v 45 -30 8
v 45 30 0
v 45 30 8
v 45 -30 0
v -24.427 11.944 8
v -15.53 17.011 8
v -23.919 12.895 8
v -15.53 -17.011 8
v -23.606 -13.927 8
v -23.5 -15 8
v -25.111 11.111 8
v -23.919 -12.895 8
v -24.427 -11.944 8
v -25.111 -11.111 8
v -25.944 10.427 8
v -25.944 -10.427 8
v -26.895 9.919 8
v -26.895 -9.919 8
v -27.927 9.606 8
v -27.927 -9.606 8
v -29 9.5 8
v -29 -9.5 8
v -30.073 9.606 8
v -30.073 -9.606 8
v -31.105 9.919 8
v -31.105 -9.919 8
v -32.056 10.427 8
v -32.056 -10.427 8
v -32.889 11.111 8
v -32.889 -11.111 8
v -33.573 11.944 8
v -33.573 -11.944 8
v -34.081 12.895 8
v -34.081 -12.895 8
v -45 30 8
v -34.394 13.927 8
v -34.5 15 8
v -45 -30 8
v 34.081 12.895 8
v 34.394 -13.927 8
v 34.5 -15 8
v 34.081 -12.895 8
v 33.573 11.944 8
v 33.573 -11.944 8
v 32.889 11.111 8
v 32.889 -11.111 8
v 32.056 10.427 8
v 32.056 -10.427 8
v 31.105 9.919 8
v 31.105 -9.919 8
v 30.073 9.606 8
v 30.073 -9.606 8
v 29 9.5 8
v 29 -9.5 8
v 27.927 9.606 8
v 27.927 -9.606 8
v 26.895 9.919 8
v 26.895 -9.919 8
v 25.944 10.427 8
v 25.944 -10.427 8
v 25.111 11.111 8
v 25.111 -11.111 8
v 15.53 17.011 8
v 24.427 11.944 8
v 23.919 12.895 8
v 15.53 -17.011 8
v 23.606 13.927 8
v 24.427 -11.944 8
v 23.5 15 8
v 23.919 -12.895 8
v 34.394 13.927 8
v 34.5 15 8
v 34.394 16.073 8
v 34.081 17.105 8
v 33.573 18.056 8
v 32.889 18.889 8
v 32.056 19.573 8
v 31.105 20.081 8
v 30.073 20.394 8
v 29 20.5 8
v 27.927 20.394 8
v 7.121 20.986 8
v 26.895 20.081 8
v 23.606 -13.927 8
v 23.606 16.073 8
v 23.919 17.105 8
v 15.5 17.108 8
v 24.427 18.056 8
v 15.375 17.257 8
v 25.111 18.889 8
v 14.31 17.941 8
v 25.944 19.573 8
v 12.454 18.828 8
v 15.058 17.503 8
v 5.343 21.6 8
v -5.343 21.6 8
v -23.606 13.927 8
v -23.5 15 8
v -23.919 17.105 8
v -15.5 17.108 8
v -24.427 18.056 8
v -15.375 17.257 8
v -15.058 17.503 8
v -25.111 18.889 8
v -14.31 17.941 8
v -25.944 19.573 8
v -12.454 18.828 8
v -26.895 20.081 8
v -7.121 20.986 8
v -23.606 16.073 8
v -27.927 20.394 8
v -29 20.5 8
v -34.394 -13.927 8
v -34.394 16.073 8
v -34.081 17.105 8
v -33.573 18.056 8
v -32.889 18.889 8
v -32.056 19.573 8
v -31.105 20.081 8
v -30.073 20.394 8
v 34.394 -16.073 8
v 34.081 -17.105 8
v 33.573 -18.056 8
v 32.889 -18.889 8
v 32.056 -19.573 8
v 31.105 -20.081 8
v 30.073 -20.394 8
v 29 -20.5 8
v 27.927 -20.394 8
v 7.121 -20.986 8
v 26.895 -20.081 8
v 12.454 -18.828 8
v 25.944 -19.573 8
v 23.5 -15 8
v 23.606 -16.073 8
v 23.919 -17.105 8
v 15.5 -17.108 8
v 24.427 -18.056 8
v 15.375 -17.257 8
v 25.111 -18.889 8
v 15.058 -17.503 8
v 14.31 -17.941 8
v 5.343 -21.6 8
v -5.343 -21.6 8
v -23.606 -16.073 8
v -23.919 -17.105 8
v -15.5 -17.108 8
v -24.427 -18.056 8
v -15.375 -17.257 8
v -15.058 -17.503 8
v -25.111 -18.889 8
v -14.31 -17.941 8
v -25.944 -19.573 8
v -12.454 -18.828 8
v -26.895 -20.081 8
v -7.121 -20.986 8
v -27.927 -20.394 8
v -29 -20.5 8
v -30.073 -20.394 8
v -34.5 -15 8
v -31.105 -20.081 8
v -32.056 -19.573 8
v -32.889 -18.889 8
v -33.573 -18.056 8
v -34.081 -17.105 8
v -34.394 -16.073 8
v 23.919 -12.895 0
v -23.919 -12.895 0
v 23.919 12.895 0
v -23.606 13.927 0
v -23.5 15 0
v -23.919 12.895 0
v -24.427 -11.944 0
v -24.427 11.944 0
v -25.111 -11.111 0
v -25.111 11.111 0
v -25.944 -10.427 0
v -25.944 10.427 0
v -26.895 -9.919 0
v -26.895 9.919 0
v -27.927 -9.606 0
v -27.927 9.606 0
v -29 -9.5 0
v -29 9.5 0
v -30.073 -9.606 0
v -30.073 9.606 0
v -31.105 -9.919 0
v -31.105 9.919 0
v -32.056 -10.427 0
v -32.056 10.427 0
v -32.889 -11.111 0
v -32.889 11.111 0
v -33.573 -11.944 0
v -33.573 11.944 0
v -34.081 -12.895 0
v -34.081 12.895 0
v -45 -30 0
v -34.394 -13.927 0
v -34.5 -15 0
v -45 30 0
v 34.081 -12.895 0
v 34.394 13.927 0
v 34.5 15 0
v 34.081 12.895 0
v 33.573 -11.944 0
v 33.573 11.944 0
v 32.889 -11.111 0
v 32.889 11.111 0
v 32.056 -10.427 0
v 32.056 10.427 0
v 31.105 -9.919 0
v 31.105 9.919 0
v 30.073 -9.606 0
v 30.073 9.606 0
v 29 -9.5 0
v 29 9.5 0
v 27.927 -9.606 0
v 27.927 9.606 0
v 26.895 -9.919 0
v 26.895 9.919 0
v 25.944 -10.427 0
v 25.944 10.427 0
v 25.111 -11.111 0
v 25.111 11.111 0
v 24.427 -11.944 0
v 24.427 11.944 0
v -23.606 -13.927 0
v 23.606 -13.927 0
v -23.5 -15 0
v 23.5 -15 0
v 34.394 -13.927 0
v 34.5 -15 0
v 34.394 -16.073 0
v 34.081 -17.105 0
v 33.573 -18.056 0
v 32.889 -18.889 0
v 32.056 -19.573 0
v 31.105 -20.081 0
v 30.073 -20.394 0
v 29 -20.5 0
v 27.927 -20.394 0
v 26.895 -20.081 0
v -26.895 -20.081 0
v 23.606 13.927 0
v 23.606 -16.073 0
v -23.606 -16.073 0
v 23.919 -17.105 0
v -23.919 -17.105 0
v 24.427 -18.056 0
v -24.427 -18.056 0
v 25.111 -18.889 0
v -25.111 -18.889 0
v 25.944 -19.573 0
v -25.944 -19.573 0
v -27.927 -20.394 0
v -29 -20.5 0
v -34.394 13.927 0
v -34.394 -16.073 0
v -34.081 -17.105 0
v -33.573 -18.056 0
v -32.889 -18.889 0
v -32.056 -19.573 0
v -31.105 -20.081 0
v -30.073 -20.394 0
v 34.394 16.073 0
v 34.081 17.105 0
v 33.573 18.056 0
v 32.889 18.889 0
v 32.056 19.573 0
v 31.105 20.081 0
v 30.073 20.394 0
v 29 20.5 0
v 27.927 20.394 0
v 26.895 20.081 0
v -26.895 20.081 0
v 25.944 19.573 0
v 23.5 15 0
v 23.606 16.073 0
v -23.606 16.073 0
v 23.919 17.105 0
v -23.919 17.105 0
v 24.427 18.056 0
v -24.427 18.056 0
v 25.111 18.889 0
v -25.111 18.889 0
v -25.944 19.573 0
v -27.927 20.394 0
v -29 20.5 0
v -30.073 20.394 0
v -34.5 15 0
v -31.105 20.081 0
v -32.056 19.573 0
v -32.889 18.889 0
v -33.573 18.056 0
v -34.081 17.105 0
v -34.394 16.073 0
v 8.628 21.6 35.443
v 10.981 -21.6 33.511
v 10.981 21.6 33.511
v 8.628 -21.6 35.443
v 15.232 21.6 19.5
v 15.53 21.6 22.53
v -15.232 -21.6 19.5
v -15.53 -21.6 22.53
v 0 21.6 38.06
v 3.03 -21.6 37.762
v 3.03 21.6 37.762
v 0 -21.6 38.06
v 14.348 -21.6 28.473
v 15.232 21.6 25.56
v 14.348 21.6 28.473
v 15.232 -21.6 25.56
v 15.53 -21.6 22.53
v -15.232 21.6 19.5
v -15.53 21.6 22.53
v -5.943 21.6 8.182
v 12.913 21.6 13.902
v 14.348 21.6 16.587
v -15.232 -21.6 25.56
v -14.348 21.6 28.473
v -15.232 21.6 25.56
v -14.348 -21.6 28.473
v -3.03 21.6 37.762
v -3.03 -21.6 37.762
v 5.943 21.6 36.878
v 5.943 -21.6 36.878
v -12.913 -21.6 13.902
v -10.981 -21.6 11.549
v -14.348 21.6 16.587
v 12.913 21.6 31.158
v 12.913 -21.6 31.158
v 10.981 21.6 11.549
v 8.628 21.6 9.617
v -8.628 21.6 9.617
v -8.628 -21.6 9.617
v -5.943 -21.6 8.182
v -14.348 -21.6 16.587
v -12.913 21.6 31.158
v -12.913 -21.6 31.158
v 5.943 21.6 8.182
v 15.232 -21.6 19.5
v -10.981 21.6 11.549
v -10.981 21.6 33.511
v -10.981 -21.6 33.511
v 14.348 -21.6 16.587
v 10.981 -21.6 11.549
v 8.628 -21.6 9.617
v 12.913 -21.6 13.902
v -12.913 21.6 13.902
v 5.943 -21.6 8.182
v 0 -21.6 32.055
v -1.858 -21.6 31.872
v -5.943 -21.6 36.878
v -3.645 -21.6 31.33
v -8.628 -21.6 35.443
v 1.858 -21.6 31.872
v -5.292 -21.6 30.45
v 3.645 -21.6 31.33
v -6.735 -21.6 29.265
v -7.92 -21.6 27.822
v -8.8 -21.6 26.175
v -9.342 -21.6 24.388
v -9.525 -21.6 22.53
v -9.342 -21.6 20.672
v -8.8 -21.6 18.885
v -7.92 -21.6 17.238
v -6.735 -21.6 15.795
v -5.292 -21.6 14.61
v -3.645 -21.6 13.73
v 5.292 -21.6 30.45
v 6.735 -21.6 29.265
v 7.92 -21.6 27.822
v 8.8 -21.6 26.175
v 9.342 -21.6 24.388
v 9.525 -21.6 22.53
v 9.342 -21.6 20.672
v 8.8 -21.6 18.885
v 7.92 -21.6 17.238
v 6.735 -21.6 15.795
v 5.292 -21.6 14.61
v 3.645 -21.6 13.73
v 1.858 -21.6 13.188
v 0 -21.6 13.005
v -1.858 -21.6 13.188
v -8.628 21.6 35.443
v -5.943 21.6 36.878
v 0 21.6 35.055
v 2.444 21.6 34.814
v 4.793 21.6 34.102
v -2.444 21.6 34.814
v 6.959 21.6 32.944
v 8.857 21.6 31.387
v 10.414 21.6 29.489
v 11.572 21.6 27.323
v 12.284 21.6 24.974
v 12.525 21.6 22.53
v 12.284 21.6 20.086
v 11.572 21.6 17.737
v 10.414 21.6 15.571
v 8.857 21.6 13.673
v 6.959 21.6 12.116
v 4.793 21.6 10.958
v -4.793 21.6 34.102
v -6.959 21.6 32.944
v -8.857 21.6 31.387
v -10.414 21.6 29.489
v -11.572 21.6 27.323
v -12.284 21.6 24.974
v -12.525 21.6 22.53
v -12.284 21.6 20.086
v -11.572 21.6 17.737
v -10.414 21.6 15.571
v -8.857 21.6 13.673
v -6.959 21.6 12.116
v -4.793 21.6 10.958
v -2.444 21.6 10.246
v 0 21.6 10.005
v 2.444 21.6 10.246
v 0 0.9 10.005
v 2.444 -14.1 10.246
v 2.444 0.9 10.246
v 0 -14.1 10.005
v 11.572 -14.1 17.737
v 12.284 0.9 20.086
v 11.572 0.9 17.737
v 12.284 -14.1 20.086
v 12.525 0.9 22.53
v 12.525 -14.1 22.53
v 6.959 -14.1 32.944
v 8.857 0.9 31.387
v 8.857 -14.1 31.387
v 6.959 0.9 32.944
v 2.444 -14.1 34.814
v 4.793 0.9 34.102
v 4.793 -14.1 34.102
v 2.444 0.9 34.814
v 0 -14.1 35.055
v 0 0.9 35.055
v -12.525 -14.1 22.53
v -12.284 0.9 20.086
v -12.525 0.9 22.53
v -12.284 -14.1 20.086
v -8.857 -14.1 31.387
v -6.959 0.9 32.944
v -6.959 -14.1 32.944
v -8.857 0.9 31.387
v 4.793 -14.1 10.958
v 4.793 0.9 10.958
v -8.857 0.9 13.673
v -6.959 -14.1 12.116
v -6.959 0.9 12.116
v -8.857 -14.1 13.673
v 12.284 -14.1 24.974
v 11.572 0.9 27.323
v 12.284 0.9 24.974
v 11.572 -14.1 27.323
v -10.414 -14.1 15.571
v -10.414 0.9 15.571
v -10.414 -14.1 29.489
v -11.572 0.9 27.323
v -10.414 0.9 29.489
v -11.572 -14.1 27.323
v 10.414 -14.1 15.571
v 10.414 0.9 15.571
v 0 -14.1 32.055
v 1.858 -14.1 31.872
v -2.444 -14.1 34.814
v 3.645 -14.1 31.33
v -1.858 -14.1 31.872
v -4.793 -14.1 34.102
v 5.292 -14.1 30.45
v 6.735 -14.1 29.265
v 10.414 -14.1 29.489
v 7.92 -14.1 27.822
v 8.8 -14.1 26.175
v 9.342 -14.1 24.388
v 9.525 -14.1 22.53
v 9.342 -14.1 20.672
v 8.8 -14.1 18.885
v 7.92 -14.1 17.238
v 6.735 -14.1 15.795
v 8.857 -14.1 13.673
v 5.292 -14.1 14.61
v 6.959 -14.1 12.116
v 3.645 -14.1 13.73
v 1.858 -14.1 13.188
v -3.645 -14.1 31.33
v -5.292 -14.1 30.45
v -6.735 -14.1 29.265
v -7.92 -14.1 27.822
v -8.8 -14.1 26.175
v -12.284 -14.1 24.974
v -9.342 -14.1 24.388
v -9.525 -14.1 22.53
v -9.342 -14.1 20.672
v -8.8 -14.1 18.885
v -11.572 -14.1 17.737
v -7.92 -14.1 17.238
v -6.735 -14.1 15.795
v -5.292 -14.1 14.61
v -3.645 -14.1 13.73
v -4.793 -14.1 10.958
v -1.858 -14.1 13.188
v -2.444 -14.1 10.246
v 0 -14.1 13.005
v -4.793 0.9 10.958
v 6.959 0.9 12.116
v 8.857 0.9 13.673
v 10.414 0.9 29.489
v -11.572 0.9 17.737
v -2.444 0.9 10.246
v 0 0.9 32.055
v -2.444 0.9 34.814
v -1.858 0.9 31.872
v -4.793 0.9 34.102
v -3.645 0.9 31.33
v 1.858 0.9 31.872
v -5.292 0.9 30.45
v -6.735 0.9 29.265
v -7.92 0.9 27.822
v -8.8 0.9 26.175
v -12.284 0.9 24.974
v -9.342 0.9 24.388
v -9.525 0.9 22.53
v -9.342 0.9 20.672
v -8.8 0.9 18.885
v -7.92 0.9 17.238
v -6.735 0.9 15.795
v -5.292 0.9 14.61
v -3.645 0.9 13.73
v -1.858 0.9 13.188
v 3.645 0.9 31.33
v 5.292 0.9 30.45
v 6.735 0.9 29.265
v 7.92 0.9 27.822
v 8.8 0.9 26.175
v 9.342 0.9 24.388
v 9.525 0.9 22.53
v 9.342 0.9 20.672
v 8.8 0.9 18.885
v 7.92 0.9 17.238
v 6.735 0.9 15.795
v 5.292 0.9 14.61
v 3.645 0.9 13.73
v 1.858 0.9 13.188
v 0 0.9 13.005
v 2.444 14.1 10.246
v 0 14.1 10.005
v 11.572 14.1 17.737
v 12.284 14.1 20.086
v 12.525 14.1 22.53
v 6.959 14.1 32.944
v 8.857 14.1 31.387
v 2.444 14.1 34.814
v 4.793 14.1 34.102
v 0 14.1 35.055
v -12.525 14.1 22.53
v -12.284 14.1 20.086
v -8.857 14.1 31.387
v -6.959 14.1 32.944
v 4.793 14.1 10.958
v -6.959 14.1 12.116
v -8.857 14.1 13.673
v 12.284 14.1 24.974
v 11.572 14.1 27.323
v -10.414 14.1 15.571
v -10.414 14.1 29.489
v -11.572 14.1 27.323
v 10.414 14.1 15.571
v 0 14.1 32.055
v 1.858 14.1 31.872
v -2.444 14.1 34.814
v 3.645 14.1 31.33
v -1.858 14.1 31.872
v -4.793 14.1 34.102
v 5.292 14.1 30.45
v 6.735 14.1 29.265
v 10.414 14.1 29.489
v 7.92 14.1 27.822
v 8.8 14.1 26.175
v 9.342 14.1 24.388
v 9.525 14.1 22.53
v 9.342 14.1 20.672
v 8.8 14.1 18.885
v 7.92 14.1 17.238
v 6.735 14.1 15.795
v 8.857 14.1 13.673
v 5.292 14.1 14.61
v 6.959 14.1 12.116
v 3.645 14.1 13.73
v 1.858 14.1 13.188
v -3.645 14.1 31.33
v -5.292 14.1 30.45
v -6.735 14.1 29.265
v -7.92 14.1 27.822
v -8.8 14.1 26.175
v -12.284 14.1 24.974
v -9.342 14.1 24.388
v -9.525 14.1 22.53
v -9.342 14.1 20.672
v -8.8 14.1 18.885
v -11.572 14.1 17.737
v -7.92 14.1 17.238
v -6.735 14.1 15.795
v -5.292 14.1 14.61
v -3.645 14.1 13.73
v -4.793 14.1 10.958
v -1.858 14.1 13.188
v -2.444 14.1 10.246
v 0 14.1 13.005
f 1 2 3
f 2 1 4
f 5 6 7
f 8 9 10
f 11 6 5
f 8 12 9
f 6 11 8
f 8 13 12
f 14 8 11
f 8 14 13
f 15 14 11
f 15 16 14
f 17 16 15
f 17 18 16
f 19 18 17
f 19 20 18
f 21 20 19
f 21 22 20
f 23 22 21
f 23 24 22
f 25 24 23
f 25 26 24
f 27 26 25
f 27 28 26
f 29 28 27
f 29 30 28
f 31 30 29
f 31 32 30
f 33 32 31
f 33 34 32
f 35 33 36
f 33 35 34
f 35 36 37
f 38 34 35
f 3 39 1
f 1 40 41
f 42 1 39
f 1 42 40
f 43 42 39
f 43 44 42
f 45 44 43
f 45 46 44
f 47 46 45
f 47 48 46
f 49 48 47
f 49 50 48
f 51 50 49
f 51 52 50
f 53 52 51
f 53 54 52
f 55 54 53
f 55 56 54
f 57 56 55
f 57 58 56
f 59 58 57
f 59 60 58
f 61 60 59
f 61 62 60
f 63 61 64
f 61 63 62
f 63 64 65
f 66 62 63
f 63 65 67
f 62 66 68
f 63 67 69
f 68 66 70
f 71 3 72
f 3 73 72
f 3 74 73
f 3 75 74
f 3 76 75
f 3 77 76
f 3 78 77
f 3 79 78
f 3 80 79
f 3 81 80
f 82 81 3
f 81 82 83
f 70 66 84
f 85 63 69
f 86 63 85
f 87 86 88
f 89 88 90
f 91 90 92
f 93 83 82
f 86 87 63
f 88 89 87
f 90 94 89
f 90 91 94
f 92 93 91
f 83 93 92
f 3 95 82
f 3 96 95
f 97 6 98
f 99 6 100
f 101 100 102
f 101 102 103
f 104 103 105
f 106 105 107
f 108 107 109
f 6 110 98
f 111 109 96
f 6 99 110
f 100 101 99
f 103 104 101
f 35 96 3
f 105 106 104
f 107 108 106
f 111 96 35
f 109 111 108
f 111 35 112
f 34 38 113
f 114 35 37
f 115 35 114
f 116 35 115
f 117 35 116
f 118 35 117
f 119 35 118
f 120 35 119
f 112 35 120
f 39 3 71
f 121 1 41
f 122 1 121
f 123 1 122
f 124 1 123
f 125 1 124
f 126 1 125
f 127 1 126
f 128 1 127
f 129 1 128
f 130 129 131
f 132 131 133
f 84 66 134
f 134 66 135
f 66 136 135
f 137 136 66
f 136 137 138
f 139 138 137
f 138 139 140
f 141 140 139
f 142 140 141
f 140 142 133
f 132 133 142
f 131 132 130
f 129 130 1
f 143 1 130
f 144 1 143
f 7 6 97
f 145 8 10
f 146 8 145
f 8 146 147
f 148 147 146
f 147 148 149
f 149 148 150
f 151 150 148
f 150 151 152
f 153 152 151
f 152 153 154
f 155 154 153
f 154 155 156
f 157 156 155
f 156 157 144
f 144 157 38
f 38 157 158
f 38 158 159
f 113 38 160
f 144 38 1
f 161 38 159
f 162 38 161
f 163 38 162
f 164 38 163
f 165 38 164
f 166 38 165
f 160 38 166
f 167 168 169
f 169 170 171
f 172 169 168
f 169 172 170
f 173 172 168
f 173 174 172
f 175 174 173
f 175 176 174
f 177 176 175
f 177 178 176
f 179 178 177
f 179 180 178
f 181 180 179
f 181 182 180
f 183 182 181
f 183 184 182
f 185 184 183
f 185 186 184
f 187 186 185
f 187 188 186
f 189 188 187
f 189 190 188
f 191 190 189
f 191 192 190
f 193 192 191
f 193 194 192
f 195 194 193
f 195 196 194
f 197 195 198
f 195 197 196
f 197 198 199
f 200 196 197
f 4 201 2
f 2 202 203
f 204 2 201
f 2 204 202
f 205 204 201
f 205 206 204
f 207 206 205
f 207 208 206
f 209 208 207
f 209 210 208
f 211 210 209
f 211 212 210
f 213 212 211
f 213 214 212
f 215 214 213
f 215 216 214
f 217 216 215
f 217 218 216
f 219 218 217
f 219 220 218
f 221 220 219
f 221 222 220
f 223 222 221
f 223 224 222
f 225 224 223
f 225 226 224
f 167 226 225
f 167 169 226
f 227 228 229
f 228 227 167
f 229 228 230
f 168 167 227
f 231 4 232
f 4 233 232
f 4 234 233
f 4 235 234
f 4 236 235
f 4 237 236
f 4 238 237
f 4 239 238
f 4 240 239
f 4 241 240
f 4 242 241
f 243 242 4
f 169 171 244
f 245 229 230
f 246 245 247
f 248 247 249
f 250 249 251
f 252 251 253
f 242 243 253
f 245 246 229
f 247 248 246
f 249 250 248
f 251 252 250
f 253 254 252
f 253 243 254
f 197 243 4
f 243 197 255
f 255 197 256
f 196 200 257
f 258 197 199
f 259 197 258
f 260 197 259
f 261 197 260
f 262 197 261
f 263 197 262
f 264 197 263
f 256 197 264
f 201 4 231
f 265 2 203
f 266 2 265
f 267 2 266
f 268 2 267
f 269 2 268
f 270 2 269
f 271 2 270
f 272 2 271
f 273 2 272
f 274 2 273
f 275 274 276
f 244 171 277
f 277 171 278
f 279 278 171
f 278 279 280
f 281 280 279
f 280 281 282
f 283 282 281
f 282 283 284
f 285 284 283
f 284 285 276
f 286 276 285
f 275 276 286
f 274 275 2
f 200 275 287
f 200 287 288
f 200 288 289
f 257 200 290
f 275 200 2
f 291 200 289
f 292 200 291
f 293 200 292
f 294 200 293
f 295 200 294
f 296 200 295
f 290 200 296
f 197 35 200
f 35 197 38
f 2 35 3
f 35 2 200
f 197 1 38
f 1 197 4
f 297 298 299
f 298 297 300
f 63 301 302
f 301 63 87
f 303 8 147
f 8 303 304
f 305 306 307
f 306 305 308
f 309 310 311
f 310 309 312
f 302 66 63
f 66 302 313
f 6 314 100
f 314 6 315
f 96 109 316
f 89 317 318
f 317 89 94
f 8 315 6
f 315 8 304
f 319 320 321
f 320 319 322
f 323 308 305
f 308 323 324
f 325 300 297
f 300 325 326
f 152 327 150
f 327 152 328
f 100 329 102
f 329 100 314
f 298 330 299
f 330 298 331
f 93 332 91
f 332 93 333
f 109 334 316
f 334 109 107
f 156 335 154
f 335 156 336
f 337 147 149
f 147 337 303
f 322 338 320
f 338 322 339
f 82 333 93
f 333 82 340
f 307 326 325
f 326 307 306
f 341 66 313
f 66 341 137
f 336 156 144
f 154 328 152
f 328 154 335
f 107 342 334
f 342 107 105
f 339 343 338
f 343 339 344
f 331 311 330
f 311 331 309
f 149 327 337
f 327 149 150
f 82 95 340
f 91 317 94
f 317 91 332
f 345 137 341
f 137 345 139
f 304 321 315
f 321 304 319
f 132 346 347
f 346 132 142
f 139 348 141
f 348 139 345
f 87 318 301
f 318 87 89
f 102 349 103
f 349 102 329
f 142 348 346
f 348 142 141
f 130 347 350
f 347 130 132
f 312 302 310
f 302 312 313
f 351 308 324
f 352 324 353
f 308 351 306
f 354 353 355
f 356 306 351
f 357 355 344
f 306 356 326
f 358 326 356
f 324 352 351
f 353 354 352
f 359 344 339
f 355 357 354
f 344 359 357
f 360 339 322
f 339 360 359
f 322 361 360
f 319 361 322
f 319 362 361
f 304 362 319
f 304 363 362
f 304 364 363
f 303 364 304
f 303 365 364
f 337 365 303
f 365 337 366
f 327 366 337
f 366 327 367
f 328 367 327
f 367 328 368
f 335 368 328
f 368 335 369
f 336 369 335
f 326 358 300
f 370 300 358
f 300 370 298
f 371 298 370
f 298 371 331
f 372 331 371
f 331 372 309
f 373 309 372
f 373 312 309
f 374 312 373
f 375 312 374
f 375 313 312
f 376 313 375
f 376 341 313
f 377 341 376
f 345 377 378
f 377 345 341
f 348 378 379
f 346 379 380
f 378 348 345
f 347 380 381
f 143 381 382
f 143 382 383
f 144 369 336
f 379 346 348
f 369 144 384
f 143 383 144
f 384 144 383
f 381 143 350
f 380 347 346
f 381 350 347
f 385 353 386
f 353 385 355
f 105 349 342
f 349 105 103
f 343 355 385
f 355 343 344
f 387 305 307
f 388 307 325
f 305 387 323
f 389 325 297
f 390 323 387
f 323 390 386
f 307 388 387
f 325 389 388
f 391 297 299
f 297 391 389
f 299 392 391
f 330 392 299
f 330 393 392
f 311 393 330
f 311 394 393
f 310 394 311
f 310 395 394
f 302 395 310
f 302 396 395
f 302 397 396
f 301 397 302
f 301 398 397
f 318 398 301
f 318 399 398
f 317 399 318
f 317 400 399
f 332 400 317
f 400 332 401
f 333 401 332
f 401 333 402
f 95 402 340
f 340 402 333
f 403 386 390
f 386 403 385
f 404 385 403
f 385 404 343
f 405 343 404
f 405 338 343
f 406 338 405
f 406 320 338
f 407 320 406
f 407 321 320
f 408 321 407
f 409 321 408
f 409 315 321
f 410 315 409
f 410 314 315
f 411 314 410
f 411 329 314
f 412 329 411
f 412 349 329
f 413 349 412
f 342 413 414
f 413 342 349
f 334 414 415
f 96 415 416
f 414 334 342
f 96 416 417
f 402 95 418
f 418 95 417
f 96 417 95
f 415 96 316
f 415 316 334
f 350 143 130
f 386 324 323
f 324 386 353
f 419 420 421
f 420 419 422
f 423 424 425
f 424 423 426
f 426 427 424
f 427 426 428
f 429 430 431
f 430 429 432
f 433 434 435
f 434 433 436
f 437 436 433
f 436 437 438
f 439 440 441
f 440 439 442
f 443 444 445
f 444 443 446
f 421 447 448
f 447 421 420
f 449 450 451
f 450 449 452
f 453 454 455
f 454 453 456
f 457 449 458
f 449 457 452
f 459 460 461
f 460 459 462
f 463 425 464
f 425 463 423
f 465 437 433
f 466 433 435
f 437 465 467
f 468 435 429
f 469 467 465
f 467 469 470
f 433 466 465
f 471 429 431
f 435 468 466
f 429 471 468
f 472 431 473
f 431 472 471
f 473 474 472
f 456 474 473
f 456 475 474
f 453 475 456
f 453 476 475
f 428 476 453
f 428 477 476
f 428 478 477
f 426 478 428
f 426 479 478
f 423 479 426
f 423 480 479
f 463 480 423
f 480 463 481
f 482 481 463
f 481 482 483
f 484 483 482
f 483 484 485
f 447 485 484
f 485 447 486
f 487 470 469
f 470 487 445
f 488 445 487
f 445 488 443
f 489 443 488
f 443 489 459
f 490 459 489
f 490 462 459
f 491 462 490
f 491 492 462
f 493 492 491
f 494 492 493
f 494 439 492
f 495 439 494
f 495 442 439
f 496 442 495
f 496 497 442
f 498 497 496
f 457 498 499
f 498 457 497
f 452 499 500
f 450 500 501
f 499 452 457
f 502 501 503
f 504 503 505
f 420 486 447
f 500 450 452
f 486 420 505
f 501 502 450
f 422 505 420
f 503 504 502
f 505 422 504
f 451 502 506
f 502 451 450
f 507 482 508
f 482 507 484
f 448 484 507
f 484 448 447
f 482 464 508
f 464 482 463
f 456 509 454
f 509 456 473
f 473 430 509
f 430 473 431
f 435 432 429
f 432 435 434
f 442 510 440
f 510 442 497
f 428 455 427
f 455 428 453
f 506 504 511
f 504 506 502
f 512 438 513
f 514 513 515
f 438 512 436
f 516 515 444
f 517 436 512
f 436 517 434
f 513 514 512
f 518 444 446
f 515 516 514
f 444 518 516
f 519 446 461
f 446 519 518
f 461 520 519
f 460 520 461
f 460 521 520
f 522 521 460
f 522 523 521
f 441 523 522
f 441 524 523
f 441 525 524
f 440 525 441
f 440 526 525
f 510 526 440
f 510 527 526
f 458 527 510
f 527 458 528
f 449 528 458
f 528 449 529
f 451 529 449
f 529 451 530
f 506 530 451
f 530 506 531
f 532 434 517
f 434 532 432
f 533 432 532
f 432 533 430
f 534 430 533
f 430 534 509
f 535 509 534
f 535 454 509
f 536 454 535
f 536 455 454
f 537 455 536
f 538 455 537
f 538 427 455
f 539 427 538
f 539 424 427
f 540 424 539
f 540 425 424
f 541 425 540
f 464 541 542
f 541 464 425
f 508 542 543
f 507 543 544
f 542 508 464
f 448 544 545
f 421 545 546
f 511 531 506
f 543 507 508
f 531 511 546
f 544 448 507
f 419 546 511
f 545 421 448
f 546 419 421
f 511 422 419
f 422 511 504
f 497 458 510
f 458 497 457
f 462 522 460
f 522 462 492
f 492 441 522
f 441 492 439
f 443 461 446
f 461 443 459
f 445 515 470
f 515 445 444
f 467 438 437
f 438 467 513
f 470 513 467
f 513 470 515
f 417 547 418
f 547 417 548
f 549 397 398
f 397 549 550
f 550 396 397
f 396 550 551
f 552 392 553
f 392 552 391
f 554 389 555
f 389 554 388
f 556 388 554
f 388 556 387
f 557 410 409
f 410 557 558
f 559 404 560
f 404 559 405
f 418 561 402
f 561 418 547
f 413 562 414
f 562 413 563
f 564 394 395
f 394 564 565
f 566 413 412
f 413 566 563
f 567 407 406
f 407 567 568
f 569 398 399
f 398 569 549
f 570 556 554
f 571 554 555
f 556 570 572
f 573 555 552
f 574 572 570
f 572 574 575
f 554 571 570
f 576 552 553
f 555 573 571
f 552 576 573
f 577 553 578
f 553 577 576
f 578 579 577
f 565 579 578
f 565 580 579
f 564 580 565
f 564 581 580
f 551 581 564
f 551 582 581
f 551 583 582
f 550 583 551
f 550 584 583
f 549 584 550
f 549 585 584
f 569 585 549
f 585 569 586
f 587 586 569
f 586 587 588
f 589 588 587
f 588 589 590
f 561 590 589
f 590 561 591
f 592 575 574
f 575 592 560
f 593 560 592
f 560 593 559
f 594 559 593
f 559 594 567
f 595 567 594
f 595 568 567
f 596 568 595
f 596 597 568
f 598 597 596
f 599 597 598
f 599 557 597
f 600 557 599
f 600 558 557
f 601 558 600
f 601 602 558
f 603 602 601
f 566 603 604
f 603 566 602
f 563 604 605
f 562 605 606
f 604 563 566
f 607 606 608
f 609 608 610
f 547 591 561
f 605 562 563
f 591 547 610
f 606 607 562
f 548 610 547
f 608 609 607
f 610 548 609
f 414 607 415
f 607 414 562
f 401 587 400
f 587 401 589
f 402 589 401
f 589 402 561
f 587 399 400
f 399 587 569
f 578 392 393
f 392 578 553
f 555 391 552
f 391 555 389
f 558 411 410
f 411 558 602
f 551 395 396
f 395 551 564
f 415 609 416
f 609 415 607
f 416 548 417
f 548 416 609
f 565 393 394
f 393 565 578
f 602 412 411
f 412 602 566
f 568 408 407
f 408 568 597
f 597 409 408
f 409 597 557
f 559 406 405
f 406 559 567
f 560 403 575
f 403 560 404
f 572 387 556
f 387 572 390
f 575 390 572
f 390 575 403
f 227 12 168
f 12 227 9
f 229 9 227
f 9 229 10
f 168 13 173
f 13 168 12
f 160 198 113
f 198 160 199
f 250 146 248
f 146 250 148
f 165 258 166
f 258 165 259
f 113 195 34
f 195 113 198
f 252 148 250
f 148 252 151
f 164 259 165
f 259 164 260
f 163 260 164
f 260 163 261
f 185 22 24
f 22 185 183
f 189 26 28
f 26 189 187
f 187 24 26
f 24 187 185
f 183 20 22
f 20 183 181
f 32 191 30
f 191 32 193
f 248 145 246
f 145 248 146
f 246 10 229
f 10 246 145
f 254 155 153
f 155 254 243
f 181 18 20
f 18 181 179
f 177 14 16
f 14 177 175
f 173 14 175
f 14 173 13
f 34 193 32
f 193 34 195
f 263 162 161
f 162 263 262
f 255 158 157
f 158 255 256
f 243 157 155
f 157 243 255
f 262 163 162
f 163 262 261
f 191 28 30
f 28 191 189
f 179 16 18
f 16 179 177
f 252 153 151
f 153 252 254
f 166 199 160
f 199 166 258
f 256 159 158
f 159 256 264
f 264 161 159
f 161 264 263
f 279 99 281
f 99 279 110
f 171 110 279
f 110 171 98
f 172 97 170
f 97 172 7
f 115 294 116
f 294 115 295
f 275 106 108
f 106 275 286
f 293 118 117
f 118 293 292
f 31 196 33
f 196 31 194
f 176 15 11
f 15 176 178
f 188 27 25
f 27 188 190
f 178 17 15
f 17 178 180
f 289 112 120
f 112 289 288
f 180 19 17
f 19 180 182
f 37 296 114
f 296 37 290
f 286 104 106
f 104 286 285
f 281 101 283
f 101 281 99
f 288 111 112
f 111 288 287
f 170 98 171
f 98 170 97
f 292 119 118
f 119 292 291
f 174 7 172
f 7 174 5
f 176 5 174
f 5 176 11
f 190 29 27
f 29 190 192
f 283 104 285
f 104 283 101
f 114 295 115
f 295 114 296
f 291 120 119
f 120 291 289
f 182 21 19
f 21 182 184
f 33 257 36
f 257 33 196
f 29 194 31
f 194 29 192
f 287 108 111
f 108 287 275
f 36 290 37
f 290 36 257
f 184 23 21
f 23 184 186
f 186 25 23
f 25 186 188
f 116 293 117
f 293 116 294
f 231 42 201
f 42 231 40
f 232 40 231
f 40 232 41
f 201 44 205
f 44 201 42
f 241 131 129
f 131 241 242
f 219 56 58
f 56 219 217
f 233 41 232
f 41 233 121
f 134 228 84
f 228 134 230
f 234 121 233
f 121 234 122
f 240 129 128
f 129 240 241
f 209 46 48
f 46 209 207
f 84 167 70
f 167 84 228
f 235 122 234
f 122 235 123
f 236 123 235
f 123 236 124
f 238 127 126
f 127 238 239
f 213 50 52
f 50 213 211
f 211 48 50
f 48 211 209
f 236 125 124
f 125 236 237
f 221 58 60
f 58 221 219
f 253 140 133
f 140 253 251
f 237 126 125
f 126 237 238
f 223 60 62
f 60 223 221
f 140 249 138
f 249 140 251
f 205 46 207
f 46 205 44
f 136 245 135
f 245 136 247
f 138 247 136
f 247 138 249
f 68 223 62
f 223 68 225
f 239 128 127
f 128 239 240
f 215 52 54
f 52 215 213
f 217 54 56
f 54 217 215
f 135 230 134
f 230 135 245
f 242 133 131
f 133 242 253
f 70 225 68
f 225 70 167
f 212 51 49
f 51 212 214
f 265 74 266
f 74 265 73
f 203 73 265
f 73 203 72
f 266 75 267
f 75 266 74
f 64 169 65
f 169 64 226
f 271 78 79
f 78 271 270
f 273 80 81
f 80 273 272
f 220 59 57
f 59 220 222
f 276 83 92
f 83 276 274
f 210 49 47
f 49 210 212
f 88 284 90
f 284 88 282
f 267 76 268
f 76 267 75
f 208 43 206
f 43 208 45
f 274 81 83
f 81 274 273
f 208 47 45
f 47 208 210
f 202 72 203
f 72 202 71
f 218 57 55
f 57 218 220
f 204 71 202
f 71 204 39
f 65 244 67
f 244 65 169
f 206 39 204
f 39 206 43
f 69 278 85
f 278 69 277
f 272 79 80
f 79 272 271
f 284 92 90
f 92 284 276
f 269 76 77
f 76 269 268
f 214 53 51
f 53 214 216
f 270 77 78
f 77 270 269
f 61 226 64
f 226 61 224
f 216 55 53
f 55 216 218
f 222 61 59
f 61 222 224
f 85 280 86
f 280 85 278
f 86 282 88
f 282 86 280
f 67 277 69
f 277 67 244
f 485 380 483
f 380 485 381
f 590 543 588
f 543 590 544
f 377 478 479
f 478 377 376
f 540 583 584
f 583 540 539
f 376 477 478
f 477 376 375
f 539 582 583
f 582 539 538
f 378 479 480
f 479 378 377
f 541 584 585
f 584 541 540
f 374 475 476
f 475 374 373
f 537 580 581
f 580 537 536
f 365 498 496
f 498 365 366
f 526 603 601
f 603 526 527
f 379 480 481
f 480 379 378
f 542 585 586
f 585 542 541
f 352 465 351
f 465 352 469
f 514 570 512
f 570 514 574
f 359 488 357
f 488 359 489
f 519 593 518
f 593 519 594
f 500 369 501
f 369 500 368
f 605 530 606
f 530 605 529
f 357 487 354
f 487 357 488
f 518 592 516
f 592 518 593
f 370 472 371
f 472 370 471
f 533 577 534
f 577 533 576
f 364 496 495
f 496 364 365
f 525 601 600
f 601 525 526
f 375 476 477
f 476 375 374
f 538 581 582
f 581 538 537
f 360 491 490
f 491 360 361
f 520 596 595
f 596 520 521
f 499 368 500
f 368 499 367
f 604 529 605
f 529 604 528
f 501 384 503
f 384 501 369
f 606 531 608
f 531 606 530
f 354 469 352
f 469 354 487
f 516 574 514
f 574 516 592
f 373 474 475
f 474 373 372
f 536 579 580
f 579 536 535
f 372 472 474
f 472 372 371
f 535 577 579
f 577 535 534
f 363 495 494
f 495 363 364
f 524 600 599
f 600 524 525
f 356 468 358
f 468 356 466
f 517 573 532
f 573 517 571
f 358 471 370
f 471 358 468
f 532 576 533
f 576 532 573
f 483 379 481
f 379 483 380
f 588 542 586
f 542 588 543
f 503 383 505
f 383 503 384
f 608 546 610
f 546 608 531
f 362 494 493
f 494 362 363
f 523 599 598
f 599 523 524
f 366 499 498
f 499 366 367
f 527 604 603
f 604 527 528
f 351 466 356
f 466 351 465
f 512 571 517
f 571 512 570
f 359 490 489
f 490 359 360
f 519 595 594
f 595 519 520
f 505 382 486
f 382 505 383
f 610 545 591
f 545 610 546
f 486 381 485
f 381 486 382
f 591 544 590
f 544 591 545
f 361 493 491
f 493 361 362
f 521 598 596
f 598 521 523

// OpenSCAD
$fn = 32;

// ----------------------------------------------------------------------
// Bearing block: 90 x 60 mm base, 19.05 mm bore at 22.53 mm
// ----------------------------------------------------------------------

// --- parameters (mm) ---
base_w = 90;              // base width
base_d = 60;              // base depth
base_t = 8;               // base thickness
bore_d = 19.05;           // shaft / bearing bore
house_r = 15.53;          // housing outer radius
house_len = 43.2;         // housing length along the shaft
foot_w = 31.06;           // foot width under the housing
foot_len = 33.2;          // foot length along the shaft
axis_z = 22.53;           // bore axis height above the base
holes_d = 11;             // mounting holes
hole_x = 29;              // mounting hole spacing
seat_d = 10;              // bearing seat depth
seat_wall = 3;            // seat wall thickness

difference() {
  union() {
    /* base plate with its underside on z = 0 */
    translate([0, 0, base_t / 2]) cube([base_w, base_d, base_t], center = true);
    /* hull foot: a straight web blending into the round housing */
    hull() {
      translate([0, 0, base_t - 0.5]) cube([foot_w, foot_len, 1.6], center = true);
      translate([0, 0, axis_z]) rotate([-90, 0, 0]) cylinder(h = house_len, d = 2 * house_r, center = true);
    }
  }
  /* bore through the housing, 2.5 mm clear on both sides */
  translate([0, 0, axis_z]) rotate([-90, 0, 0]) cylinder(h = house_len + 5, d = bore_d, center = true);
  /* bearing seats, recessed into both ends of the housing */
  for (sy = [-1, 1]) {
    translate([0, sy * (house_len / 2 - seat_d + 2.5), axis_z]) rotate([-90, 0, 0]) cylinder(h = seat_d + 5, d = bore_d + 2 * seat_wall);
  }
  /* mounting holes through the base plate */
  for (hx = [-29, 29]) {
    for (hy = [-15, 15]) {
      translate([hx, hy, -2.5]) cylinder(h = base_t + 5, d = holes_d);
    }
  }
}
